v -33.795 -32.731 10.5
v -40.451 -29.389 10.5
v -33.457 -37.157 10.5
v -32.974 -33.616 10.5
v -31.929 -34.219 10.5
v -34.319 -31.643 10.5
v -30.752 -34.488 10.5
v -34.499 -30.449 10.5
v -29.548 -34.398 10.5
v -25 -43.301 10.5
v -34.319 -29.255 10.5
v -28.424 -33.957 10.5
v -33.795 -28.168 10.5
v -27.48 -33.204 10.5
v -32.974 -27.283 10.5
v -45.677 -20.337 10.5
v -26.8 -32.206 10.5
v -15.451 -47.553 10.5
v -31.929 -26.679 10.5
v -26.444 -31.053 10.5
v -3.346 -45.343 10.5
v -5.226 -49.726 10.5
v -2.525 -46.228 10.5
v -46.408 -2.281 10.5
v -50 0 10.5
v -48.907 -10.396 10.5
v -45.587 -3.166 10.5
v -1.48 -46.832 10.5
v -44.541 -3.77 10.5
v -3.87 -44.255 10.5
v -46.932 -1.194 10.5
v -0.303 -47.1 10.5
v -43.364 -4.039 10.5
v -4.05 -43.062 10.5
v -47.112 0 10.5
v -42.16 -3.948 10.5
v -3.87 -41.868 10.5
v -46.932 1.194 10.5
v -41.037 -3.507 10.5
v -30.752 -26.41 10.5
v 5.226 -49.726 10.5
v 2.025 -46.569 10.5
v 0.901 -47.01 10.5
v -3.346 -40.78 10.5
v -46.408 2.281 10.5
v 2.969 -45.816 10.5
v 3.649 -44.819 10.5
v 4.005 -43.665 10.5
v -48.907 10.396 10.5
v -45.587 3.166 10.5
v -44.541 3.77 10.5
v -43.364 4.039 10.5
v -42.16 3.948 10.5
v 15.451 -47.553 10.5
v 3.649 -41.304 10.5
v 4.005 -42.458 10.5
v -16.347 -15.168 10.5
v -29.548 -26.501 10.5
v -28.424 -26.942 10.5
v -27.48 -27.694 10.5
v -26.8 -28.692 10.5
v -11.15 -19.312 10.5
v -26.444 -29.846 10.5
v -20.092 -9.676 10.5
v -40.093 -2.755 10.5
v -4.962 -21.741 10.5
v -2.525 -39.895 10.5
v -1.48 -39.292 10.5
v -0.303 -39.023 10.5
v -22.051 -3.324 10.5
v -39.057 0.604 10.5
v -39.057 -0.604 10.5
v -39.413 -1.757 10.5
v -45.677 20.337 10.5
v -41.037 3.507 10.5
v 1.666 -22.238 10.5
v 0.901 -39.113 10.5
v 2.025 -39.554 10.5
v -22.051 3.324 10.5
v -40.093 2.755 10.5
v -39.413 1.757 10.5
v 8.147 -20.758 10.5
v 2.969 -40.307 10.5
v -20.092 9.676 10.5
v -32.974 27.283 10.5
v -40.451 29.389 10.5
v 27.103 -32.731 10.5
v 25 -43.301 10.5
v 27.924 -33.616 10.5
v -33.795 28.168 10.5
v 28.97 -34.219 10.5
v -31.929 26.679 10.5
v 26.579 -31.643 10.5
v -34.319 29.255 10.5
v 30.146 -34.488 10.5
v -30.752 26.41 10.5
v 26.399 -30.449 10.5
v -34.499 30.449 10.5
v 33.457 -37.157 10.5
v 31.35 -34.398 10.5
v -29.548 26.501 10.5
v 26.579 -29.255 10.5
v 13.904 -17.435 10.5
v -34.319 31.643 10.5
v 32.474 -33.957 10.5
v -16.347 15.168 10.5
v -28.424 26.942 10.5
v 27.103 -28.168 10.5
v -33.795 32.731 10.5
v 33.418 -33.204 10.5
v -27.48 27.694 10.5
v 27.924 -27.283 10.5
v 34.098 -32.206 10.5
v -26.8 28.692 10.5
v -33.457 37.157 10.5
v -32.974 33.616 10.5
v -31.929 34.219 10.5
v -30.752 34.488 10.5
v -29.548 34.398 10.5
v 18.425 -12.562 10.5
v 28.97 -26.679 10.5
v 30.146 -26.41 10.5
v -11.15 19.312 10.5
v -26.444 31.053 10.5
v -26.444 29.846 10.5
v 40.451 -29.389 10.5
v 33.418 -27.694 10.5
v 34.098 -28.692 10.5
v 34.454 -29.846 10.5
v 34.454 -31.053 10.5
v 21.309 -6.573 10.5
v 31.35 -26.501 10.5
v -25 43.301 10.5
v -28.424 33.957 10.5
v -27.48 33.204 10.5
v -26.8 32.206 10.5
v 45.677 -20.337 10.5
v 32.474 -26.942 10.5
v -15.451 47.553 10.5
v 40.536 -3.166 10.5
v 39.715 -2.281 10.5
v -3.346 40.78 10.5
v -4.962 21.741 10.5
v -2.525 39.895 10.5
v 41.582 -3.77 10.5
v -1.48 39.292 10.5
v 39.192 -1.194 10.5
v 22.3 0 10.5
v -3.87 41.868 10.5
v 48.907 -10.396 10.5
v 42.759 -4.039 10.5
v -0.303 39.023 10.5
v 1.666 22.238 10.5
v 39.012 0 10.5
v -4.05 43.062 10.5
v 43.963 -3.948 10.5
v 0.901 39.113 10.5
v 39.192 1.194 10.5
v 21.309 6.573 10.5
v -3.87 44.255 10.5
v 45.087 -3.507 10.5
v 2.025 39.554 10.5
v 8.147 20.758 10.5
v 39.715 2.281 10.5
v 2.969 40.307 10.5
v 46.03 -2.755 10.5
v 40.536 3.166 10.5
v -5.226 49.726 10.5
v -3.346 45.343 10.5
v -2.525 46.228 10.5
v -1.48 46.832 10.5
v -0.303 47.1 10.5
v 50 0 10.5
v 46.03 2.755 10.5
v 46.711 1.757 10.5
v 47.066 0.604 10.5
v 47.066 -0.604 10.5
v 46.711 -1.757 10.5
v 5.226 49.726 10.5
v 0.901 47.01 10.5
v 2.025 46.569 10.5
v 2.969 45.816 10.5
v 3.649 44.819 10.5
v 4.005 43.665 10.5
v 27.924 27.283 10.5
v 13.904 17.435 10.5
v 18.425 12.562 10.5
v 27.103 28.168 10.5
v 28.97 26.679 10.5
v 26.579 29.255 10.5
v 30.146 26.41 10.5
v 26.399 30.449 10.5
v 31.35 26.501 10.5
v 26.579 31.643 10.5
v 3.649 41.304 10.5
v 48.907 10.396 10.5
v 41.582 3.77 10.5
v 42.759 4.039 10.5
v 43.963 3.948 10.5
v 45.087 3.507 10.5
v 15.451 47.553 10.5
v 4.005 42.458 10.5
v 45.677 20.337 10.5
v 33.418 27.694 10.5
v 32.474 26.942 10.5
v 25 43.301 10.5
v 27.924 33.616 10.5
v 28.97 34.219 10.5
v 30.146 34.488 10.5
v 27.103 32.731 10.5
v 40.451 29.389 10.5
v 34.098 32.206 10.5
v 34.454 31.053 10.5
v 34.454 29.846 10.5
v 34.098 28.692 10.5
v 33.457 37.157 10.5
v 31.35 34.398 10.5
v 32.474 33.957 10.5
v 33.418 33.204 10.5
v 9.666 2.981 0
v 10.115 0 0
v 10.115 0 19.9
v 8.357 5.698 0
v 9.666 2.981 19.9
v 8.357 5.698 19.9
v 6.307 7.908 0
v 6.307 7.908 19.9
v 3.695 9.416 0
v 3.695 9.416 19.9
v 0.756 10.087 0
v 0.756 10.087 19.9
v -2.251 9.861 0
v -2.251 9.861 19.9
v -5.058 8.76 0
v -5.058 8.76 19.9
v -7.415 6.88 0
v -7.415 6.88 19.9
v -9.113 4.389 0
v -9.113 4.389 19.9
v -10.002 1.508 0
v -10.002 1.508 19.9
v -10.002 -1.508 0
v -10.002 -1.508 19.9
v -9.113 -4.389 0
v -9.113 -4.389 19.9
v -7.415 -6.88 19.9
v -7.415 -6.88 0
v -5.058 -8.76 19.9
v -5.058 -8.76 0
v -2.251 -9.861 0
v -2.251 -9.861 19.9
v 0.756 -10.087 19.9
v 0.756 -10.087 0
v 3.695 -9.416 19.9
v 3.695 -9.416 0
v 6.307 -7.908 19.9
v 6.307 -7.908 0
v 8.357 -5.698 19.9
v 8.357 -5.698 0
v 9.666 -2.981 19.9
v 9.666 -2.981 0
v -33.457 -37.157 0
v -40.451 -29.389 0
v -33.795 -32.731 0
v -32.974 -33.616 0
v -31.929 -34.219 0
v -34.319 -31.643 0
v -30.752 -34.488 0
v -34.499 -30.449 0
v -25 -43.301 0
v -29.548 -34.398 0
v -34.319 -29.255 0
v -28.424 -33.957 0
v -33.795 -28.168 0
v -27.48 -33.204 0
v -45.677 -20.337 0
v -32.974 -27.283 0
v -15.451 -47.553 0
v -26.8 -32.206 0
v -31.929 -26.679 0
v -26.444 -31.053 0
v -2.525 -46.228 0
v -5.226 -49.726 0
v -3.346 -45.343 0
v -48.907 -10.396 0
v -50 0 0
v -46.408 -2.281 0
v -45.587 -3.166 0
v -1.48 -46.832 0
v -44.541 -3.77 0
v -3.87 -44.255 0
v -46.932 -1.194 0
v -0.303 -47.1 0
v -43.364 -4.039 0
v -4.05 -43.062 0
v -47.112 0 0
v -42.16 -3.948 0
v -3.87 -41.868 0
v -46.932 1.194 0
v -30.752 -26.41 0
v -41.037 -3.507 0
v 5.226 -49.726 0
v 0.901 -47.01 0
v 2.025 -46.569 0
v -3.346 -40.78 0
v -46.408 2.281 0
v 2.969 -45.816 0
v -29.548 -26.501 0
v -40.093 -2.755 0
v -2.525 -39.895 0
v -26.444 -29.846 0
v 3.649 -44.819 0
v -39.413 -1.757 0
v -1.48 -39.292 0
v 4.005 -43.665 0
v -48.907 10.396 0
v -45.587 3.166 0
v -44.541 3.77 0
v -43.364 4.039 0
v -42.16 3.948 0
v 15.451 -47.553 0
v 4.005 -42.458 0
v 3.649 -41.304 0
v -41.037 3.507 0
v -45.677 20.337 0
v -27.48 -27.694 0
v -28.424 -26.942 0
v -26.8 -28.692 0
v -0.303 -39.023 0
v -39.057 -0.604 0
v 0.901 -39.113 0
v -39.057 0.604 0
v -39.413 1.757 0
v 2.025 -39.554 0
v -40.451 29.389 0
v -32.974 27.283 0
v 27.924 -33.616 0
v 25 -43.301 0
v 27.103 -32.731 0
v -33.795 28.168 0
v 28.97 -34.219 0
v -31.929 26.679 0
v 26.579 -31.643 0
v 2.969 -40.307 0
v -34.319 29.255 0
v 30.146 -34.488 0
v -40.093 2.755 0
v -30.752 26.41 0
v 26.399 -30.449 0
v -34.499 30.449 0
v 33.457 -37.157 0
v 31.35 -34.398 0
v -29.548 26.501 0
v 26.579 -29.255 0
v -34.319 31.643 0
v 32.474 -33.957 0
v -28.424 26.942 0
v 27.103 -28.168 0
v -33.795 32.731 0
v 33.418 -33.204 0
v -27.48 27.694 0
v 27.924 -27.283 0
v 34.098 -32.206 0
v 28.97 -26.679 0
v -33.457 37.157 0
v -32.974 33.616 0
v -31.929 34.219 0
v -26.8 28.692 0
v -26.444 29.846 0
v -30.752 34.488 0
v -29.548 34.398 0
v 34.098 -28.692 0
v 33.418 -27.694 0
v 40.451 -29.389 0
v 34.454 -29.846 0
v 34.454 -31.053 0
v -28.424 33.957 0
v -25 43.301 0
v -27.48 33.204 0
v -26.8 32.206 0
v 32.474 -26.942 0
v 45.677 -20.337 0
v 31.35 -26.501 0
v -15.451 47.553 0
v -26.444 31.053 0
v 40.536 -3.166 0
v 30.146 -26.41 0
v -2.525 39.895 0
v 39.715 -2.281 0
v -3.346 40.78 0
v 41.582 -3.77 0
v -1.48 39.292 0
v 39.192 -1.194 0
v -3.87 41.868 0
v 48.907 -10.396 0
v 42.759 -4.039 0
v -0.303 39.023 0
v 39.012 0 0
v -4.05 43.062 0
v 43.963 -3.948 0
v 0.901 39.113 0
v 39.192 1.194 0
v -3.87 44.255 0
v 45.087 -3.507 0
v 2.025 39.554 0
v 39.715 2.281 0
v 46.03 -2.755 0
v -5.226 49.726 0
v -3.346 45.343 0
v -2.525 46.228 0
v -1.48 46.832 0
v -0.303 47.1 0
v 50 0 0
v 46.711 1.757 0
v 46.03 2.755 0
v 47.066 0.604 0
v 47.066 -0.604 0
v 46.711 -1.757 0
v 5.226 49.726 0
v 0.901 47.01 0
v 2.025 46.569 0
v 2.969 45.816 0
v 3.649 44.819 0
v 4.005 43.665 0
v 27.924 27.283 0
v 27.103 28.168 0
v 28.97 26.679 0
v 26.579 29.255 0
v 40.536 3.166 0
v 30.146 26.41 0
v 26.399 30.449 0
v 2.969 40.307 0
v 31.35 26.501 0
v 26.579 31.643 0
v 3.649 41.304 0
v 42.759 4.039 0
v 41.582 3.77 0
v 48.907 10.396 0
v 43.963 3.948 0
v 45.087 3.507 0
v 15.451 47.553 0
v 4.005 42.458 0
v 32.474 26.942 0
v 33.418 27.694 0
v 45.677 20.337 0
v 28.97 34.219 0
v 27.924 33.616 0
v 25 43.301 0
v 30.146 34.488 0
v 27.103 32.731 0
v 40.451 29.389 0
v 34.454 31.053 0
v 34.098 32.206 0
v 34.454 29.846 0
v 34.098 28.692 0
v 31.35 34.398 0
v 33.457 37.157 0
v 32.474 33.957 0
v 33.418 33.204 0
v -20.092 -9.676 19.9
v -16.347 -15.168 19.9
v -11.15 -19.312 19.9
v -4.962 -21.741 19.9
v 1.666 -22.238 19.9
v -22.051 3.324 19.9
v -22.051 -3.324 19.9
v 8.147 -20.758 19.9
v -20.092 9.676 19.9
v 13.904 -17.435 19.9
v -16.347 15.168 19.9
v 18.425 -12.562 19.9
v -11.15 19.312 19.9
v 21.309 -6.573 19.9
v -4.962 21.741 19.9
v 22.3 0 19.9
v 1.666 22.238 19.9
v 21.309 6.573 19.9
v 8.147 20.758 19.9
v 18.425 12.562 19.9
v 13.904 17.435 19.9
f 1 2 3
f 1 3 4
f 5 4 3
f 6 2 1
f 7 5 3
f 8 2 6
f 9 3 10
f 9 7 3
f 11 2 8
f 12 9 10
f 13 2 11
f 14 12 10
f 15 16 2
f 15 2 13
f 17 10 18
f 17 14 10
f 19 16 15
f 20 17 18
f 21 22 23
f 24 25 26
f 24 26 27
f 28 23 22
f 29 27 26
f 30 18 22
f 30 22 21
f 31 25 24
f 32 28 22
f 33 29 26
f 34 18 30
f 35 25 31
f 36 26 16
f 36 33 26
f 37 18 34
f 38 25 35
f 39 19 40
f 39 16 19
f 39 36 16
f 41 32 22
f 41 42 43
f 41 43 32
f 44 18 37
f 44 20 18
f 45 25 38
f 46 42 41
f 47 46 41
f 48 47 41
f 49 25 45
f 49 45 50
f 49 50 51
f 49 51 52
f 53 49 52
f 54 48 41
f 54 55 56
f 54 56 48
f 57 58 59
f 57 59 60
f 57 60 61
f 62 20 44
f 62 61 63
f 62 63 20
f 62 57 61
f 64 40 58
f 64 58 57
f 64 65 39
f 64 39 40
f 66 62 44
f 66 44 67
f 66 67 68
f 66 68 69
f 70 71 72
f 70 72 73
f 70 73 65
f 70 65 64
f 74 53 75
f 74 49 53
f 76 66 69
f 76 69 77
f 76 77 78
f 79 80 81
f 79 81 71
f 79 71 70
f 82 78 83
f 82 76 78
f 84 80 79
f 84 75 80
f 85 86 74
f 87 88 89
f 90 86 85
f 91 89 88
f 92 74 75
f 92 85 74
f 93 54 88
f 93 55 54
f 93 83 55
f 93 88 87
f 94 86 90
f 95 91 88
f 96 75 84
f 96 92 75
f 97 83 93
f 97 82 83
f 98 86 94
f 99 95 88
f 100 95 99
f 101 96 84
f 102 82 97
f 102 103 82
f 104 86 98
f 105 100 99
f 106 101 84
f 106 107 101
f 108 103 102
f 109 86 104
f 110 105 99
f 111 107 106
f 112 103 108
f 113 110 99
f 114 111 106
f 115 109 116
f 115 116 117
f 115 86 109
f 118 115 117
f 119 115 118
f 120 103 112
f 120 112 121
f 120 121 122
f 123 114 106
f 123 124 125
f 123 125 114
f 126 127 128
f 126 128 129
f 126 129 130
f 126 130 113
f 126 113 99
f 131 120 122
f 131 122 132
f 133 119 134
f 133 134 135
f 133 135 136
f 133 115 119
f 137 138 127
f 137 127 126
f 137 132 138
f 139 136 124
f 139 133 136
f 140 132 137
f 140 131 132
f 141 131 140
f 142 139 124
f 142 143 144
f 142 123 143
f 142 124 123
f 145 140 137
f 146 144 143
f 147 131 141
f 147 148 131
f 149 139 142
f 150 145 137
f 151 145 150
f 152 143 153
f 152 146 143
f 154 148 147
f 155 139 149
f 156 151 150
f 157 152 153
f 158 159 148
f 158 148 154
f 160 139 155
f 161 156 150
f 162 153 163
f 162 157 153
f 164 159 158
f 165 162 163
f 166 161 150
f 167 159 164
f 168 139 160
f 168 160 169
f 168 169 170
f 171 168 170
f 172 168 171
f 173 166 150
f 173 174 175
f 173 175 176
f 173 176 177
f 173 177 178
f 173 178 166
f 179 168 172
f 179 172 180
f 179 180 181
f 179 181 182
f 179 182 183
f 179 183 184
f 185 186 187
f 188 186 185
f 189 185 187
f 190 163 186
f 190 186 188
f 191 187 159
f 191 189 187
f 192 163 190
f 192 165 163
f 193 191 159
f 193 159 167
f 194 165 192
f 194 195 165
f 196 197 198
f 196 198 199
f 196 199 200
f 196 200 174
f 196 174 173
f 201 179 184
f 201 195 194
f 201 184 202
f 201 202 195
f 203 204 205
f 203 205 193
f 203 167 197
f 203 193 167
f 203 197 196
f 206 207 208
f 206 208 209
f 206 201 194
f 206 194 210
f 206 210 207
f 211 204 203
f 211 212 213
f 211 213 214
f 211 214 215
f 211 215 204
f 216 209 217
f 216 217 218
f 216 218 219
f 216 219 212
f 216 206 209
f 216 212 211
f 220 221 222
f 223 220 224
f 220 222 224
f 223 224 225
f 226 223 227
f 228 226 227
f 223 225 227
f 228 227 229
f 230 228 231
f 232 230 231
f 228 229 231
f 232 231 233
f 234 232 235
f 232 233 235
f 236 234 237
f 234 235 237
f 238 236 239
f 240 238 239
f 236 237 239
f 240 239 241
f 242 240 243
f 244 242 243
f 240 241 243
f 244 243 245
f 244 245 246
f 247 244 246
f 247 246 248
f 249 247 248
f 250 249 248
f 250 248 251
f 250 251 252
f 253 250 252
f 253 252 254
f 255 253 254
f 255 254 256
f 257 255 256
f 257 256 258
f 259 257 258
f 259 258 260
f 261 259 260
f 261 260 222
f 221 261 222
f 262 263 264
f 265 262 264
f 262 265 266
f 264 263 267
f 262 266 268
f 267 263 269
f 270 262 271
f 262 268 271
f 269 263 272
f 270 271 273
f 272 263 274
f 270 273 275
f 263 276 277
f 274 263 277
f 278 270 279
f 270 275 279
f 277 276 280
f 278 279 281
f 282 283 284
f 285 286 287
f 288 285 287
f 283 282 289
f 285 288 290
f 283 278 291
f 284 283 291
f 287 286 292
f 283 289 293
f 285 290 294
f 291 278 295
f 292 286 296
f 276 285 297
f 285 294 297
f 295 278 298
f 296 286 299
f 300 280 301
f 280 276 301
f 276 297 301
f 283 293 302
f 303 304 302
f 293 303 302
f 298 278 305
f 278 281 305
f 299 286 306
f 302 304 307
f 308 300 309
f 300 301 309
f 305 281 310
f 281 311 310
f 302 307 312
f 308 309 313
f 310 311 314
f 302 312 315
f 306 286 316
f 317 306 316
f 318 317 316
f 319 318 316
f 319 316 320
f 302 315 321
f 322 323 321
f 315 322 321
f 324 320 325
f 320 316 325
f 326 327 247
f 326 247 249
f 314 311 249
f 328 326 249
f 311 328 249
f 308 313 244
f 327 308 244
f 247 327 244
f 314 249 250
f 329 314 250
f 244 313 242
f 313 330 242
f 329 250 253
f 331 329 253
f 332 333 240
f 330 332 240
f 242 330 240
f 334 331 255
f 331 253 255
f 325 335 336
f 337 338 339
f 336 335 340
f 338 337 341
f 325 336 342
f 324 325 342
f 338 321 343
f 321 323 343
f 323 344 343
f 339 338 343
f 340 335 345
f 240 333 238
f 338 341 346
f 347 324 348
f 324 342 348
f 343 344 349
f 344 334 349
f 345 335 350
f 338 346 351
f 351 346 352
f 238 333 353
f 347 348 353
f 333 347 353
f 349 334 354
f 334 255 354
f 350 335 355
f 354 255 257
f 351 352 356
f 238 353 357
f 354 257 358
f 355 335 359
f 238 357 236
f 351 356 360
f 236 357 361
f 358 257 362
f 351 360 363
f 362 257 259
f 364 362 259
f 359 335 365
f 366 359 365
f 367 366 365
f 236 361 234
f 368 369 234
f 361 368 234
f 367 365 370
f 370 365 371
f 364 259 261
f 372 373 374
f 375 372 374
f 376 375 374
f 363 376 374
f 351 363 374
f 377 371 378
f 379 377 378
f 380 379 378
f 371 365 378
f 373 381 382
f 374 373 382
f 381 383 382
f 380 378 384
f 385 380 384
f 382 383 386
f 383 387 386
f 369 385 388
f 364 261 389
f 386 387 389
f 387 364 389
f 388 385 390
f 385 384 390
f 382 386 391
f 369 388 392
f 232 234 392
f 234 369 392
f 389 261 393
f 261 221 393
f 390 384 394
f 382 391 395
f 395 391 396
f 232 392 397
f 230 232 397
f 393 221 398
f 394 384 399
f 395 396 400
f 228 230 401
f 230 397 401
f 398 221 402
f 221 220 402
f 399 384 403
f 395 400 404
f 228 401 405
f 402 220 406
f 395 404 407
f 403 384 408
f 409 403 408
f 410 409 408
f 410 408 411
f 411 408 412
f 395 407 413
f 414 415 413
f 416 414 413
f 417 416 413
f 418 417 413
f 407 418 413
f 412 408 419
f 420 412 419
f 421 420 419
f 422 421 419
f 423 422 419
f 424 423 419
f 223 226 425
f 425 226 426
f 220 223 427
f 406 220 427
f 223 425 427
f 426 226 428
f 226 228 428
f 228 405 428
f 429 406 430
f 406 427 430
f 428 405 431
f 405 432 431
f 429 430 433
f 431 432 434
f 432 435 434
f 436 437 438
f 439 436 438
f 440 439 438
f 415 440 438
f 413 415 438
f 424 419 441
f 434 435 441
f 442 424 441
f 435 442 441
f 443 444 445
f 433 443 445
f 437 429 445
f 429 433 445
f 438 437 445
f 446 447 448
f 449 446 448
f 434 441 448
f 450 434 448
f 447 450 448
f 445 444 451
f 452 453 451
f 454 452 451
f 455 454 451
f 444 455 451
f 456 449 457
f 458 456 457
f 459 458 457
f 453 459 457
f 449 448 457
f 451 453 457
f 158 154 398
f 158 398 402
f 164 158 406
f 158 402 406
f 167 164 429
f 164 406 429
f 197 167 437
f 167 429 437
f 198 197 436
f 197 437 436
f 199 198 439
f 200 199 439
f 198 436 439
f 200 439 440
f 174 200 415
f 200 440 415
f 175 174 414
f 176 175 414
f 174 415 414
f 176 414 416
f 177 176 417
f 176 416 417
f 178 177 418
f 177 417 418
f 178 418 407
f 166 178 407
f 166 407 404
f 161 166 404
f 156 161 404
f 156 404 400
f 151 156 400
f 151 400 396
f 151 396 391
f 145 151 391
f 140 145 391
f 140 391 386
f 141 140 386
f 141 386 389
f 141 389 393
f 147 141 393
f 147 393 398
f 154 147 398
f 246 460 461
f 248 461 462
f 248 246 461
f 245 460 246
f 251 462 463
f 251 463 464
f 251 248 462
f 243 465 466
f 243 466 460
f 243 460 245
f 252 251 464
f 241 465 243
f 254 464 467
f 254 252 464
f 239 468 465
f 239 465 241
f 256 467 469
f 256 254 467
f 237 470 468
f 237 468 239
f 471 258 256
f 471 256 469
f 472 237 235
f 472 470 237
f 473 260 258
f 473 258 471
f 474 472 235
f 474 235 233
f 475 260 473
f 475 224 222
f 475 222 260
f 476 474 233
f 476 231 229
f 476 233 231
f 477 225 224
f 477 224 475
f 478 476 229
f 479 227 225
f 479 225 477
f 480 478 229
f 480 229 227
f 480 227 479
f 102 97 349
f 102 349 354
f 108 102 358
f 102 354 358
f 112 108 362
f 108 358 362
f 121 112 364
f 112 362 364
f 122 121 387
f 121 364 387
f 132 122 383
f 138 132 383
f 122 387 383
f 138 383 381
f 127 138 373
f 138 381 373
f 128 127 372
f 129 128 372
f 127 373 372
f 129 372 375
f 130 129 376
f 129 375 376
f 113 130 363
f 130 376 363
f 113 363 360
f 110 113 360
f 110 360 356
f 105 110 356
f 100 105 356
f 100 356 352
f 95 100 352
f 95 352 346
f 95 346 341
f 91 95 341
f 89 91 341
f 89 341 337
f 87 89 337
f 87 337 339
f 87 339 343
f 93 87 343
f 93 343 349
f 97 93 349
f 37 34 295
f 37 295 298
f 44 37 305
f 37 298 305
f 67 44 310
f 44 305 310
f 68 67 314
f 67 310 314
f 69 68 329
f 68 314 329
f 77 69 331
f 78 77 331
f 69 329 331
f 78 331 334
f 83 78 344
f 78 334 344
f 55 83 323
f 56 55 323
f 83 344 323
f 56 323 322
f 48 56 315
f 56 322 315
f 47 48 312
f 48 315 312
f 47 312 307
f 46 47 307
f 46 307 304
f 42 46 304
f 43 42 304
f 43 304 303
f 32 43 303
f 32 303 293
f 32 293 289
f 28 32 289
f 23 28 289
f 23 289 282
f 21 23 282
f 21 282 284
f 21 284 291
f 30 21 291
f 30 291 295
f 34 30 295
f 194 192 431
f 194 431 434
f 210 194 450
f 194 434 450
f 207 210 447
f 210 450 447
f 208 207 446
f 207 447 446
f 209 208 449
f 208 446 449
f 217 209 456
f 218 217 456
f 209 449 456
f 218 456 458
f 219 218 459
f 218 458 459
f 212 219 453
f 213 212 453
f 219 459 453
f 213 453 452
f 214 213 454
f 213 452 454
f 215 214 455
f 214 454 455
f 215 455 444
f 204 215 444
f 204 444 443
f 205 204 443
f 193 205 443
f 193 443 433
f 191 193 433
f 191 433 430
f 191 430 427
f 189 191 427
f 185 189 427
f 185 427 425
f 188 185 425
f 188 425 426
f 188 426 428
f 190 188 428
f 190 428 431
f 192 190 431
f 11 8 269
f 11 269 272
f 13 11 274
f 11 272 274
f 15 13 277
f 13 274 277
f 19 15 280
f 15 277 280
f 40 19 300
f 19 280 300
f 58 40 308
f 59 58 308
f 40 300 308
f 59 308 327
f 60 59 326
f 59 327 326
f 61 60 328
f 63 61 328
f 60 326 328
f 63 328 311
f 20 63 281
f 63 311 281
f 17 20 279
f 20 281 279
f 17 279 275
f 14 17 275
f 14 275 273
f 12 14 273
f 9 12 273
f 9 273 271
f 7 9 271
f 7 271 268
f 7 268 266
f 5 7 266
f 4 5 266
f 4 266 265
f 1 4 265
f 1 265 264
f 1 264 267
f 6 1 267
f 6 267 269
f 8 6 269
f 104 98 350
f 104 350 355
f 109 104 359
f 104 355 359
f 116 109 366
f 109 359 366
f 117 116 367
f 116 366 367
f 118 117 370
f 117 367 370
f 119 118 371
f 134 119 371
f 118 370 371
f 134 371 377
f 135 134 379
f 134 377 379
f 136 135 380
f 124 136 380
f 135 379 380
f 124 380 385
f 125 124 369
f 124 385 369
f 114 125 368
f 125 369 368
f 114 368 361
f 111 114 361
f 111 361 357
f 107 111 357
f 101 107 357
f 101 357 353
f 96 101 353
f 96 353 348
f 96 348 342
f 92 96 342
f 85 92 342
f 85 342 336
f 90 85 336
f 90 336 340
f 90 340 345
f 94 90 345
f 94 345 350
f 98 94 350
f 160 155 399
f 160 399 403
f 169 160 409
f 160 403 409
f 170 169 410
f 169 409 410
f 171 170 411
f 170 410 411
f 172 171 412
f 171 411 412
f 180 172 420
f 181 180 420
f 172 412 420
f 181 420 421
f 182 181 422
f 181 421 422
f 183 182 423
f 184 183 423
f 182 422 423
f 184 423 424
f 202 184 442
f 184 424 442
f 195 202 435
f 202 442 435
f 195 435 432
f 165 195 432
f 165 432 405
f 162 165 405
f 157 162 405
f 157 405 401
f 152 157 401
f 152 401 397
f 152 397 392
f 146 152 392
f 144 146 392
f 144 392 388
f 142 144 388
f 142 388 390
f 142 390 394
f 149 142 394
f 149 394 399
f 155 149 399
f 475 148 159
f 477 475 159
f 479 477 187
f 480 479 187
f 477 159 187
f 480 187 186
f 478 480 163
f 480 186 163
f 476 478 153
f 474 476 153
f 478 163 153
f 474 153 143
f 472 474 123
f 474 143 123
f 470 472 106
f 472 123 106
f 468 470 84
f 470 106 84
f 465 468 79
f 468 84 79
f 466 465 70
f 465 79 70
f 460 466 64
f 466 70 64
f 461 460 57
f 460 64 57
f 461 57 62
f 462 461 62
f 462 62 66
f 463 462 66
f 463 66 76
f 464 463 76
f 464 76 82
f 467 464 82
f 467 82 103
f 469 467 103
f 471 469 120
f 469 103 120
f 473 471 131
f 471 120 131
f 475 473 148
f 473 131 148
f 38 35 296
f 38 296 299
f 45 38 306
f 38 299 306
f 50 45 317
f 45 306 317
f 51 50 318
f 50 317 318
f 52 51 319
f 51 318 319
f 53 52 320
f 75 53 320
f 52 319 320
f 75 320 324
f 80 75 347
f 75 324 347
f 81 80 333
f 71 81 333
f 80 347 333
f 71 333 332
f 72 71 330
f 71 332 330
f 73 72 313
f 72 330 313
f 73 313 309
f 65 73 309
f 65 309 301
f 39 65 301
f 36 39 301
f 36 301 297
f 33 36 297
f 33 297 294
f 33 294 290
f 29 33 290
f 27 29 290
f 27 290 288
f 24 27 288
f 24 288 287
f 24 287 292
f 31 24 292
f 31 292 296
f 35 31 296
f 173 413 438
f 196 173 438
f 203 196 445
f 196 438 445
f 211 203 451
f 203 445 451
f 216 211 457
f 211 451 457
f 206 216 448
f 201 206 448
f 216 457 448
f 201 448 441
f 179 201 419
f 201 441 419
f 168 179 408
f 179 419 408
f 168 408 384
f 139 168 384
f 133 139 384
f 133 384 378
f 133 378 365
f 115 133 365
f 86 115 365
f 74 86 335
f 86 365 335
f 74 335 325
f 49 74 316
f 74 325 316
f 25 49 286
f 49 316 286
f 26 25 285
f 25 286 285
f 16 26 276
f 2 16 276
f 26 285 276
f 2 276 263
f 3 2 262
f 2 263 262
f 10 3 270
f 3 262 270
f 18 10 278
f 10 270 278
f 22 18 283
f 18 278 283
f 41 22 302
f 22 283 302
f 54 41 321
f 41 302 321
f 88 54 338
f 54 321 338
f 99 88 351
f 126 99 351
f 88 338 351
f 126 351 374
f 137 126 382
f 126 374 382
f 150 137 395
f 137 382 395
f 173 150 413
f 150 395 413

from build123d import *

# Parameters (mm, degrees)
F0_R     = 50
F1_DEPTH = 10.5
F2_R     = 22.3
F3_DEPTH = 9.4
F6_D     = 8.1
F7_R     = 10.115
F8_DEPTH = 25


with BuildPart() as f1:
    # F0 (on Top) → F1 (new body)
    with BuildSketch(Plane.XY):
        Circle(F0_R)
    extrude(amount=F1_DEPTH)

    # F2 (on face) → F3 (join)
    with BuildSketch(Plane.XY.offset(10.5)):
        Circle(F2_R)
    extrude(amount=F3_DEPTH)

    # F6 (through all)
    with Locations(Plane.XY.offset(10.5)):
        with Locations((0, 43.061581), (30.449136, 30.449136), (43.061581, 0), (30.449136, -30.449136), (0, -43.061581), (-30.449136, -30.449136), (-43.061581, 0), (-30.449136, 30.449136)):
            Hole(F6_D / 2)

    # F7 (on face) → F8 (cut)
    with BuildSketch(Plane.XY.offset(19.9)):
        Circle(F7_R)
    extrude(amount=-F8_DEPTH, mode=Mode.SUBTRACT)


solid = f1.part
